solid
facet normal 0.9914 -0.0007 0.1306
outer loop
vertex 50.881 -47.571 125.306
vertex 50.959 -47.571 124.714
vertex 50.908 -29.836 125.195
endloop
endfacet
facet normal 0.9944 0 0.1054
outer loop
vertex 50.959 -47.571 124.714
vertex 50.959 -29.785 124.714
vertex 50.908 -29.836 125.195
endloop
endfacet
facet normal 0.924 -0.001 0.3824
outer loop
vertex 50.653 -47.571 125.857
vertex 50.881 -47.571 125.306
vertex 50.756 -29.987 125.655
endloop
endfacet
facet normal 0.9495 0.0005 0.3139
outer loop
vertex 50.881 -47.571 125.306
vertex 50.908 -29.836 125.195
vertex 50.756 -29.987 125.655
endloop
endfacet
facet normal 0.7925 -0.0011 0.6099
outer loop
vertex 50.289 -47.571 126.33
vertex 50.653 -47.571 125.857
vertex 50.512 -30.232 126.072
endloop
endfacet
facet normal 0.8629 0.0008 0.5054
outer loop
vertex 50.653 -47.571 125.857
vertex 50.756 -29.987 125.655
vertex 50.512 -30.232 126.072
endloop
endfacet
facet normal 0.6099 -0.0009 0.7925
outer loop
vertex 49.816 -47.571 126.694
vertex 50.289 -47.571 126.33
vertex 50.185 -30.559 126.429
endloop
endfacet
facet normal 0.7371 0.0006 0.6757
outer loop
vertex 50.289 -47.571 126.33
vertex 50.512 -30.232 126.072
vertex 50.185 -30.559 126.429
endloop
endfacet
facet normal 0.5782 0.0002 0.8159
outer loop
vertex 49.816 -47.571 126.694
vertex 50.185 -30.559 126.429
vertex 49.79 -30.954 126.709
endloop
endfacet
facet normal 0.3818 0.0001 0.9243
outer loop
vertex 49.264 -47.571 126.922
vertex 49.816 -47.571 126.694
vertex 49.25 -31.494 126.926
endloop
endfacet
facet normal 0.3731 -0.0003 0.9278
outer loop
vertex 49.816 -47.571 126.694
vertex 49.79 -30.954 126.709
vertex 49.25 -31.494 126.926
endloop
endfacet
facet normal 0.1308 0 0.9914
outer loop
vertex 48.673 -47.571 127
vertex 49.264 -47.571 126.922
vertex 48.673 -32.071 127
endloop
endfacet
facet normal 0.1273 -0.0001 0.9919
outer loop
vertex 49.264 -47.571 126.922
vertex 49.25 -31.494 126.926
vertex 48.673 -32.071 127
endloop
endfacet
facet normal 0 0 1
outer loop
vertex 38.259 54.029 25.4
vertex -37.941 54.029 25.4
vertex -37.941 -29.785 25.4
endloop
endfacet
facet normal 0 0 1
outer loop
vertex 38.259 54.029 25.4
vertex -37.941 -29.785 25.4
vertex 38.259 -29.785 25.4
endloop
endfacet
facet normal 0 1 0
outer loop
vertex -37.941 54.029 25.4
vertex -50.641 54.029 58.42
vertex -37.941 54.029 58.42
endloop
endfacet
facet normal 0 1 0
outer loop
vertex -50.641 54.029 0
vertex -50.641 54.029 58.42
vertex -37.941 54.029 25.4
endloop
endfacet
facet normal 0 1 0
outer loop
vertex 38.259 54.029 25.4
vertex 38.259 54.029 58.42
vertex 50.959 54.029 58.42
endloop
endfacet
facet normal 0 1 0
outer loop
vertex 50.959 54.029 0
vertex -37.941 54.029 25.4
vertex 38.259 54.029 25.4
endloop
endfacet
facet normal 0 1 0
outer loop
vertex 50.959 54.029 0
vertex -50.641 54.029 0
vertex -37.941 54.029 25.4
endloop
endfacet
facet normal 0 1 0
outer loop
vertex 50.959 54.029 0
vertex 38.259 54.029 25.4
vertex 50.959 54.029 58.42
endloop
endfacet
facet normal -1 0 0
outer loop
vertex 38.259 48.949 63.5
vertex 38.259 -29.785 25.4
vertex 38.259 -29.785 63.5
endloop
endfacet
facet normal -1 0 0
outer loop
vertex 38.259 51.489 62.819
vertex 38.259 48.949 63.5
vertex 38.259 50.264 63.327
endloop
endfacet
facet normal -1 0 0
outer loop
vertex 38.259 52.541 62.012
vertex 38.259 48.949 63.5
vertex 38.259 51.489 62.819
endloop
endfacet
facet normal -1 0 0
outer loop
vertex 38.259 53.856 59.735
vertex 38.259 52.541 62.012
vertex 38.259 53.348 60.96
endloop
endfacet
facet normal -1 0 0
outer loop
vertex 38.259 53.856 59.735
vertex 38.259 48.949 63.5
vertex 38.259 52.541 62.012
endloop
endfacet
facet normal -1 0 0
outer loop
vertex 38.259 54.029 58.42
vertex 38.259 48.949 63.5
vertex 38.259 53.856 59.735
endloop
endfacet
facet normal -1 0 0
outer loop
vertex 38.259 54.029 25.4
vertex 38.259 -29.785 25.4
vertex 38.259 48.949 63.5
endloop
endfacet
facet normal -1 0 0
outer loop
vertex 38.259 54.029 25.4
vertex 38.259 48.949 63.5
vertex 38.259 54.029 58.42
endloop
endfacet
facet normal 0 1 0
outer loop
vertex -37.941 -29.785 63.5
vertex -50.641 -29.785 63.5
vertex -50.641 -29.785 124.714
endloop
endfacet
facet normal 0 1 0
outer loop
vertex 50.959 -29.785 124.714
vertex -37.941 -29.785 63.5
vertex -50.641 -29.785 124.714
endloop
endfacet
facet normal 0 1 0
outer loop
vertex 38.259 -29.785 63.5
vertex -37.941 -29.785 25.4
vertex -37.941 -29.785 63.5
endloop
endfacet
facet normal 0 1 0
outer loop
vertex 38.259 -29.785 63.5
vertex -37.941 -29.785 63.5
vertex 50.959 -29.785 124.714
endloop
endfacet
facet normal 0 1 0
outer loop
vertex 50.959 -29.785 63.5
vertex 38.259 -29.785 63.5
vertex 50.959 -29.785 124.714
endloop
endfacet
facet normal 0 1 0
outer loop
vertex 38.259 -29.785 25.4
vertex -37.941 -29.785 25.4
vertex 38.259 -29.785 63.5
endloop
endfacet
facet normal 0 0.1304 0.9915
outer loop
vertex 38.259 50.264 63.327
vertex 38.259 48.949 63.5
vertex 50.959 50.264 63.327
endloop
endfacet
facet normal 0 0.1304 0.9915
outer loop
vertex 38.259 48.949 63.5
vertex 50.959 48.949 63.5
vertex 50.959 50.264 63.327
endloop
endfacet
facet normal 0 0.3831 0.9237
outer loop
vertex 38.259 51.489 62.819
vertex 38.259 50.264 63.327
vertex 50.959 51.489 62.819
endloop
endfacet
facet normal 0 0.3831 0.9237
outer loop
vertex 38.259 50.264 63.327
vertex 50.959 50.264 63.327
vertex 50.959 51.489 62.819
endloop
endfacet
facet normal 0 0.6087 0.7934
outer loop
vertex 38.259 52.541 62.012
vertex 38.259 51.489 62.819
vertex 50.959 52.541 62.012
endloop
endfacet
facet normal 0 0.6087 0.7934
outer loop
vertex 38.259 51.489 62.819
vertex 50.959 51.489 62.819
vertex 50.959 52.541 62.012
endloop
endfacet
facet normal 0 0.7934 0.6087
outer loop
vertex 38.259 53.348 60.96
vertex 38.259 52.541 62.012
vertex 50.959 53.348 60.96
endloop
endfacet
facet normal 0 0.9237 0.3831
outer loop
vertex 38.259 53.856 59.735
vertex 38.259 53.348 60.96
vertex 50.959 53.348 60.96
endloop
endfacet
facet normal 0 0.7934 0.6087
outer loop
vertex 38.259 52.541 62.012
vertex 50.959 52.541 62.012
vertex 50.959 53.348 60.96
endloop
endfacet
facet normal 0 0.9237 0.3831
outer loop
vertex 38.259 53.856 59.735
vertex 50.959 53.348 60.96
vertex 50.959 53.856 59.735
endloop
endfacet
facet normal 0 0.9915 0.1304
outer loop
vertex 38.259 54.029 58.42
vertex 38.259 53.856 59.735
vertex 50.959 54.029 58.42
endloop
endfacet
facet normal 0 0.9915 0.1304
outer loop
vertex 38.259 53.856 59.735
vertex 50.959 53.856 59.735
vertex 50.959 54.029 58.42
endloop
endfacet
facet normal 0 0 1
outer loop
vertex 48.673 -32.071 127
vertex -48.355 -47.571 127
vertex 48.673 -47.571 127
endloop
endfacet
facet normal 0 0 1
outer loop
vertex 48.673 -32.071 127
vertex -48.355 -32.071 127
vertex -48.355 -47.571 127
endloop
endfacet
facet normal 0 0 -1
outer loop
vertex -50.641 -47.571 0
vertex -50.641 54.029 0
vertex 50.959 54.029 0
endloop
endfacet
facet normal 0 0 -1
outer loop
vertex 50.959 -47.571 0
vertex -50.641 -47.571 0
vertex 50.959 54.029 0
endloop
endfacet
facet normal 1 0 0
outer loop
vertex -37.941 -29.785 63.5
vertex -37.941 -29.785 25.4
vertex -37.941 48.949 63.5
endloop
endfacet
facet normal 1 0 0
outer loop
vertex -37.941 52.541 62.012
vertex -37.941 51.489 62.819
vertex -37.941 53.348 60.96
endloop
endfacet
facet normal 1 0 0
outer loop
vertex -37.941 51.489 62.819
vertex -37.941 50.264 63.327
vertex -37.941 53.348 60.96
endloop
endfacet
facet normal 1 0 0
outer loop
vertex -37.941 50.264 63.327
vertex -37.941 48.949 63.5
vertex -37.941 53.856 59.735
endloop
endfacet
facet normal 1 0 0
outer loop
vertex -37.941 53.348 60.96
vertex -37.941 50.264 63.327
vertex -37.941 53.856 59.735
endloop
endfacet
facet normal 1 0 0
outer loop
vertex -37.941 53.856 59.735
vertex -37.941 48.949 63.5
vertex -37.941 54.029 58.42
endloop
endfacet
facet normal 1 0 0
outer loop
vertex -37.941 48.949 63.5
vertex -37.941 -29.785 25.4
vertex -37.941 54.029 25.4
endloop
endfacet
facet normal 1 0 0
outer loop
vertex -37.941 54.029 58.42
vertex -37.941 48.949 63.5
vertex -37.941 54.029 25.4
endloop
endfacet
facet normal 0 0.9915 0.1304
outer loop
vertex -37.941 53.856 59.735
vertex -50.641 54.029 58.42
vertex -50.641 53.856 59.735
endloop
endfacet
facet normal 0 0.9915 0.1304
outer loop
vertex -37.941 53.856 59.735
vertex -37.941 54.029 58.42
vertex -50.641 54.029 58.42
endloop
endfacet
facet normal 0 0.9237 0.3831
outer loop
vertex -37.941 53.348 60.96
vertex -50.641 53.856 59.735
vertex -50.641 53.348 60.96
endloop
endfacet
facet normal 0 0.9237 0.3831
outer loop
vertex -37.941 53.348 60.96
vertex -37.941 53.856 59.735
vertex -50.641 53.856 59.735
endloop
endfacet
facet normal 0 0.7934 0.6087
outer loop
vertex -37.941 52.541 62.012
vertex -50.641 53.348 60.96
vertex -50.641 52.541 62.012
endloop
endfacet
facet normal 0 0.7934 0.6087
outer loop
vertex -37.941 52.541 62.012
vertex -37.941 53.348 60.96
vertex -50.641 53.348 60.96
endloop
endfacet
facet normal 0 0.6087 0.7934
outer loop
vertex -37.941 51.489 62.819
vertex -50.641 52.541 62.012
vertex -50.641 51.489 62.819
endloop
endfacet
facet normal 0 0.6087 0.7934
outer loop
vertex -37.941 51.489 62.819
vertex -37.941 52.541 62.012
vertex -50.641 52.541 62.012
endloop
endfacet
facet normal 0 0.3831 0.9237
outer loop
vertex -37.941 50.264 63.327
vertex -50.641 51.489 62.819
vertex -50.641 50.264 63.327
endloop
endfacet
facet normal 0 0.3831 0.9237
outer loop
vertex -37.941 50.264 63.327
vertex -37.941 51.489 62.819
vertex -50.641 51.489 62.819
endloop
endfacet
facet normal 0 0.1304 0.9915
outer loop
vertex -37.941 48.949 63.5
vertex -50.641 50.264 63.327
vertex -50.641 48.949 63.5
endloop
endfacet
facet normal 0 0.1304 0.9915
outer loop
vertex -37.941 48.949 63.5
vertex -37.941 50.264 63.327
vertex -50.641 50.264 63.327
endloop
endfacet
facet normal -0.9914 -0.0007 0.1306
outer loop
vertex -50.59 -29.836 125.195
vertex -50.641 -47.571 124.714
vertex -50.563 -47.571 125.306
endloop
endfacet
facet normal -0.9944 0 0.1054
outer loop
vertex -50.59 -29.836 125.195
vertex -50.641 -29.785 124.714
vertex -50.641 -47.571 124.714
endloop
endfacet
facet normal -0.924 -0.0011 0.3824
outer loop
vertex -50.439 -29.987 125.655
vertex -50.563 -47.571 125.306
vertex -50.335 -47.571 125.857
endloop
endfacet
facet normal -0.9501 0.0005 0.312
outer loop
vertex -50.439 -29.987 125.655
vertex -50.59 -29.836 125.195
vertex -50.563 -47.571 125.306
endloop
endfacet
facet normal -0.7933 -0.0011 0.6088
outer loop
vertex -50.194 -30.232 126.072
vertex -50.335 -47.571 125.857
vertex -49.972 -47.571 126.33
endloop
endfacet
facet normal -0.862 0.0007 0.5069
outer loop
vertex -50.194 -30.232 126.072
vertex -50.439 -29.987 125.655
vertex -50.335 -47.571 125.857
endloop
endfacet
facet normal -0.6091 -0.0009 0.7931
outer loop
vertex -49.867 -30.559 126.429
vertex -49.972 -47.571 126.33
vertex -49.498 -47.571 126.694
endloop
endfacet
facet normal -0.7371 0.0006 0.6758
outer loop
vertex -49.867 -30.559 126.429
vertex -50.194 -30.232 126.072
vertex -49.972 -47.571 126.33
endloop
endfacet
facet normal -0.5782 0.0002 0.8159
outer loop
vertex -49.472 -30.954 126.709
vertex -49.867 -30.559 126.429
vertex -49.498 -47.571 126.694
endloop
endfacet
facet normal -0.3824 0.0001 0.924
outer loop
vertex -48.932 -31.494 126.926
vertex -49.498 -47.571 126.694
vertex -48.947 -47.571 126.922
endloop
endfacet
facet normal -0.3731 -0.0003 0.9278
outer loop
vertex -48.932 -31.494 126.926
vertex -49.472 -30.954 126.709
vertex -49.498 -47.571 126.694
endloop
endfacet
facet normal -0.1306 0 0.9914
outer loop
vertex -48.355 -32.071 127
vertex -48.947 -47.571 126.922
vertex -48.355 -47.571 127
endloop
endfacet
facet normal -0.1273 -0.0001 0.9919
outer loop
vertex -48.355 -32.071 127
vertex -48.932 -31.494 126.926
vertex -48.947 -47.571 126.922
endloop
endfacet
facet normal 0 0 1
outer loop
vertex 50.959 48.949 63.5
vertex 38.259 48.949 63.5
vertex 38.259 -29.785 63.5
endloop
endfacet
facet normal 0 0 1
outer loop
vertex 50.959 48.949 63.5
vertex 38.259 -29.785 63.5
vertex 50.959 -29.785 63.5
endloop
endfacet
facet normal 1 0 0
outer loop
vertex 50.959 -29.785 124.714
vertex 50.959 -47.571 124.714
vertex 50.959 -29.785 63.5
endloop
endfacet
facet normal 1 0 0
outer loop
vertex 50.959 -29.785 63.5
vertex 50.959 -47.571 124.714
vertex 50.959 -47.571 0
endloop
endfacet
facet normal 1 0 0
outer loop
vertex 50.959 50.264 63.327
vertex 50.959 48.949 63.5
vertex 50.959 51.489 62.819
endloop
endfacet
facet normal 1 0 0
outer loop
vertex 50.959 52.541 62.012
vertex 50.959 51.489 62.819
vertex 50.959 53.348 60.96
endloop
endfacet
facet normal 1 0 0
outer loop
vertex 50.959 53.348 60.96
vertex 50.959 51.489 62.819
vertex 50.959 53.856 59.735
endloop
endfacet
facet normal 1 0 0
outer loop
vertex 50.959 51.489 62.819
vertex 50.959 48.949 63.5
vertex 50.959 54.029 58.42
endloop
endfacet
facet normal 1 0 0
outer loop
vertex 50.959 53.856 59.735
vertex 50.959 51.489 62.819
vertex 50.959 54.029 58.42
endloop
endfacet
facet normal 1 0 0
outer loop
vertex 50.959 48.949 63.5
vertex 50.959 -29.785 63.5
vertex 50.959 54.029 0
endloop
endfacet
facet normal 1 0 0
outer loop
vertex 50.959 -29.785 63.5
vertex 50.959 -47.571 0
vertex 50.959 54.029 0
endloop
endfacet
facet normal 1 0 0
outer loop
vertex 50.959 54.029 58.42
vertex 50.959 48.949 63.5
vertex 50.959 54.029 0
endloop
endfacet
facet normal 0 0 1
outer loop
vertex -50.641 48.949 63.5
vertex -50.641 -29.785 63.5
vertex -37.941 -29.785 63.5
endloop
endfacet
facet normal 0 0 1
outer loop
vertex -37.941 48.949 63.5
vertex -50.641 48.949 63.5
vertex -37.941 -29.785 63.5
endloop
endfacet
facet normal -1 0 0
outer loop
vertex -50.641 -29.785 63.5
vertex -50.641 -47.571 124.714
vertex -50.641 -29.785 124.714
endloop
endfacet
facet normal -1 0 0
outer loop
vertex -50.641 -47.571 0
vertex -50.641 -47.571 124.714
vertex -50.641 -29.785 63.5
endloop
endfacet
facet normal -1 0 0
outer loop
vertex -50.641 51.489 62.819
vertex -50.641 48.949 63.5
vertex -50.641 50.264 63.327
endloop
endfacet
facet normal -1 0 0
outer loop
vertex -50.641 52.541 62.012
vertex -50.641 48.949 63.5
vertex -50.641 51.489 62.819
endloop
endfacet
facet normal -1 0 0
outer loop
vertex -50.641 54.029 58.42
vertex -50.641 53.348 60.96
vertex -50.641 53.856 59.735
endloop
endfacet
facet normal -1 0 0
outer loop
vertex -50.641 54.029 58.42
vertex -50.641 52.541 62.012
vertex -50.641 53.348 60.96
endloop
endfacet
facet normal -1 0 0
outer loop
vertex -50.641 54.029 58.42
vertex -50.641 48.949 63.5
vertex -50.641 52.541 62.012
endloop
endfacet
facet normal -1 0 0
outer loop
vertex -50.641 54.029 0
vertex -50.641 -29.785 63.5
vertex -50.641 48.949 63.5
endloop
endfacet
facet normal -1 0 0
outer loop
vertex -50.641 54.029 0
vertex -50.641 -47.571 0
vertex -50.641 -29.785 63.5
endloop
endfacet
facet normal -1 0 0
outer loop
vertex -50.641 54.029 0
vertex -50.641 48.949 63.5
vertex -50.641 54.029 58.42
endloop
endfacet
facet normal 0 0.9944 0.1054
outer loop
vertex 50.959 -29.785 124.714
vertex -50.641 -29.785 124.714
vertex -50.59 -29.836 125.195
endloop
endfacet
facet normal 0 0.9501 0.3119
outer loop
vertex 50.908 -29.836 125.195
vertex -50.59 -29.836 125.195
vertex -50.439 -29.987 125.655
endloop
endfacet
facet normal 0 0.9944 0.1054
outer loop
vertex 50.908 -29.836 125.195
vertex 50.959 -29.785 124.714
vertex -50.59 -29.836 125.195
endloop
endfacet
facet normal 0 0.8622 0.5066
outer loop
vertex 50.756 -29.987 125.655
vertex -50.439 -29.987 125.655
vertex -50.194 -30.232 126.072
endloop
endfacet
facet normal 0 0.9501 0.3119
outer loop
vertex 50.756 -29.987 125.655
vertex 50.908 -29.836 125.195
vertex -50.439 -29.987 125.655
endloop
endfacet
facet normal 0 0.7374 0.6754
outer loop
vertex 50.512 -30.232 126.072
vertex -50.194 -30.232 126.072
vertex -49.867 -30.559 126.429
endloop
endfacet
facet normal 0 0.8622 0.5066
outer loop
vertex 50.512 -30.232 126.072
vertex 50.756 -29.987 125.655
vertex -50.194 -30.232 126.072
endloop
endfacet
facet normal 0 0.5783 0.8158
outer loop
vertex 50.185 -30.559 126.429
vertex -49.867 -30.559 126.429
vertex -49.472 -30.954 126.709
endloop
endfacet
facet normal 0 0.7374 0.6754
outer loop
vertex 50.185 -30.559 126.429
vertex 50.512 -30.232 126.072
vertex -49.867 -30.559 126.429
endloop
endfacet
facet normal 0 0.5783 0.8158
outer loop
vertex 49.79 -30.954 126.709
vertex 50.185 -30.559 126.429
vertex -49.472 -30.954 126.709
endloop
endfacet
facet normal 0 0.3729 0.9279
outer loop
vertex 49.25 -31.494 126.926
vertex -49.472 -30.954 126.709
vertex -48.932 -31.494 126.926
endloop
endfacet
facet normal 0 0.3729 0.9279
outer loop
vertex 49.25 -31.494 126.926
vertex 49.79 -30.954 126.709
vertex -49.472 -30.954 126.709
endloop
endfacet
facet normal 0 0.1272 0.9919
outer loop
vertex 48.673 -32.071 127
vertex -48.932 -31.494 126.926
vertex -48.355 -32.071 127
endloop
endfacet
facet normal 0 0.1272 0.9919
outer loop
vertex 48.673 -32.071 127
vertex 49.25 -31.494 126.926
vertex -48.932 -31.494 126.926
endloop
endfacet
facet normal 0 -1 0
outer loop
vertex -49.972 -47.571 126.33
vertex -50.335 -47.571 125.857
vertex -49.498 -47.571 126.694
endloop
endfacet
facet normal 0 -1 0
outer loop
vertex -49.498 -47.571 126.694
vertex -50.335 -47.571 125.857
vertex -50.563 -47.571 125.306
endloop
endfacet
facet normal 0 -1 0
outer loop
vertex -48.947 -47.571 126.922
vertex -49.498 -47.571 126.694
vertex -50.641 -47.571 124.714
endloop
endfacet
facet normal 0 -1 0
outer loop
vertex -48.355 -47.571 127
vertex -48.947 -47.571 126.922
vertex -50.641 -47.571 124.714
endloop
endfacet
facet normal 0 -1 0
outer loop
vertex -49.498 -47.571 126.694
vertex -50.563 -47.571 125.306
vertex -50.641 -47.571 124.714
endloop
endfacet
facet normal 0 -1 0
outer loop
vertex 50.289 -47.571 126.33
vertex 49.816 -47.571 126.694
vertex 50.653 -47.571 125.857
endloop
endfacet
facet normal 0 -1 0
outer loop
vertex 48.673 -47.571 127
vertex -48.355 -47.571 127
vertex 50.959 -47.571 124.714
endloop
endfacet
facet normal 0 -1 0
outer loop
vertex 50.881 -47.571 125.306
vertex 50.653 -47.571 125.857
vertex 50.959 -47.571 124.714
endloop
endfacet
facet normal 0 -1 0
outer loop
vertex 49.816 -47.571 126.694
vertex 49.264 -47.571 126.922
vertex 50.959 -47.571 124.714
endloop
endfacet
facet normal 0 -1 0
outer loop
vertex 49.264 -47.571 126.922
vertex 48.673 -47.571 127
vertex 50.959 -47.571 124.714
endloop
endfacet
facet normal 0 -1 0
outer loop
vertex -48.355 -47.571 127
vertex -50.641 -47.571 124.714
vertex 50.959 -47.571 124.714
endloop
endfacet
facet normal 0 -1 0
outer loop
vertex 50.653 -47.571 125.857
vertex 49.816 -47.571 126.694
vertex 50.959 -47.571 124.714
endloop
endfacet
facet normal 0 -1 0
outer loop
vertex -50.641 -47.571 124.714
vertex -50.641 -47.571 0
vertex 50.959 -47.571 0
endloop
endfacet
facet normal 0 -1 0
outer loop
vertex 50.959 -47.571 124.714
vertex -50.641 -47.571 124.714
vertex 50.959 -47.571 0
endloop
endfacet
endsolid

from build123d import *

# Parameters (mm, degrees)
F0_W     = 101.6
F0_H     = 101.6
F1_DEPTH = 25.4
F2_W     = 101.6
F2_H     = 17.786168
F3_DEPTH = 101.6
F4_W     = 12.7
F4_H     = 83.813832
F5_DEPTH = 38.1
F6_R     = 5.08
F7_R     = 5.08
F8_R     = 2.286


with BuildPart() as f1:
    # F0 (on Top) → F1 (new body)
    with BuildSketch(Plane.XY):
        with Locations((0.158782, 3.229056)):
            Rectangle(F0_W, F0_H)
    extrude(amount=F1_DEPTH)

    # F2 (on face) → F3 (join)
    with BuildSketch(Plane.XY.offset(25.4)):
        with Locations((0.158782, -38.67786)):
            Rectangle(F2_W, F2_H)
    extrude(amount=F3_DEPTH)

    # F4 (on face) → F5 (join)
    with BuildSketch(Plane.XY.offset(25.4)):
        with Locations((44.608782, 12.12214)):
            Rectangle(F4_W, F4_H)
        with Locations((-44.291218, 12.12214)):
            Rectangle(F4_W, F4_H)
    extrude(amount=F5_DEPTH)

    # F6
    f6_edges = [f1.edges().sort_by_distance(p)[0] for p in [
        (44.608782, 54.029056, 63.5),
    ]]
    fillet(f6_edges, radius=F6_R)

    # F7
    f7_edges = [f1.edges().sort_by_distance(p)[0] for p in [
        (-44.291218, 54.029056, 63.5),
    ]]
    fillet(f7_edges, radius=F7_R)

    # F8
    f8_edges = [f1.edges().sort_by_distance(p)[0] for p in [
        (0.158782, -29.784776, 127),
        (-50.641218, -38.67786, 127),
        (50.958782, -38.67786, 127),
    ]]
    fillet(f8_edges, radius=F8_R)


solid = f1.part
